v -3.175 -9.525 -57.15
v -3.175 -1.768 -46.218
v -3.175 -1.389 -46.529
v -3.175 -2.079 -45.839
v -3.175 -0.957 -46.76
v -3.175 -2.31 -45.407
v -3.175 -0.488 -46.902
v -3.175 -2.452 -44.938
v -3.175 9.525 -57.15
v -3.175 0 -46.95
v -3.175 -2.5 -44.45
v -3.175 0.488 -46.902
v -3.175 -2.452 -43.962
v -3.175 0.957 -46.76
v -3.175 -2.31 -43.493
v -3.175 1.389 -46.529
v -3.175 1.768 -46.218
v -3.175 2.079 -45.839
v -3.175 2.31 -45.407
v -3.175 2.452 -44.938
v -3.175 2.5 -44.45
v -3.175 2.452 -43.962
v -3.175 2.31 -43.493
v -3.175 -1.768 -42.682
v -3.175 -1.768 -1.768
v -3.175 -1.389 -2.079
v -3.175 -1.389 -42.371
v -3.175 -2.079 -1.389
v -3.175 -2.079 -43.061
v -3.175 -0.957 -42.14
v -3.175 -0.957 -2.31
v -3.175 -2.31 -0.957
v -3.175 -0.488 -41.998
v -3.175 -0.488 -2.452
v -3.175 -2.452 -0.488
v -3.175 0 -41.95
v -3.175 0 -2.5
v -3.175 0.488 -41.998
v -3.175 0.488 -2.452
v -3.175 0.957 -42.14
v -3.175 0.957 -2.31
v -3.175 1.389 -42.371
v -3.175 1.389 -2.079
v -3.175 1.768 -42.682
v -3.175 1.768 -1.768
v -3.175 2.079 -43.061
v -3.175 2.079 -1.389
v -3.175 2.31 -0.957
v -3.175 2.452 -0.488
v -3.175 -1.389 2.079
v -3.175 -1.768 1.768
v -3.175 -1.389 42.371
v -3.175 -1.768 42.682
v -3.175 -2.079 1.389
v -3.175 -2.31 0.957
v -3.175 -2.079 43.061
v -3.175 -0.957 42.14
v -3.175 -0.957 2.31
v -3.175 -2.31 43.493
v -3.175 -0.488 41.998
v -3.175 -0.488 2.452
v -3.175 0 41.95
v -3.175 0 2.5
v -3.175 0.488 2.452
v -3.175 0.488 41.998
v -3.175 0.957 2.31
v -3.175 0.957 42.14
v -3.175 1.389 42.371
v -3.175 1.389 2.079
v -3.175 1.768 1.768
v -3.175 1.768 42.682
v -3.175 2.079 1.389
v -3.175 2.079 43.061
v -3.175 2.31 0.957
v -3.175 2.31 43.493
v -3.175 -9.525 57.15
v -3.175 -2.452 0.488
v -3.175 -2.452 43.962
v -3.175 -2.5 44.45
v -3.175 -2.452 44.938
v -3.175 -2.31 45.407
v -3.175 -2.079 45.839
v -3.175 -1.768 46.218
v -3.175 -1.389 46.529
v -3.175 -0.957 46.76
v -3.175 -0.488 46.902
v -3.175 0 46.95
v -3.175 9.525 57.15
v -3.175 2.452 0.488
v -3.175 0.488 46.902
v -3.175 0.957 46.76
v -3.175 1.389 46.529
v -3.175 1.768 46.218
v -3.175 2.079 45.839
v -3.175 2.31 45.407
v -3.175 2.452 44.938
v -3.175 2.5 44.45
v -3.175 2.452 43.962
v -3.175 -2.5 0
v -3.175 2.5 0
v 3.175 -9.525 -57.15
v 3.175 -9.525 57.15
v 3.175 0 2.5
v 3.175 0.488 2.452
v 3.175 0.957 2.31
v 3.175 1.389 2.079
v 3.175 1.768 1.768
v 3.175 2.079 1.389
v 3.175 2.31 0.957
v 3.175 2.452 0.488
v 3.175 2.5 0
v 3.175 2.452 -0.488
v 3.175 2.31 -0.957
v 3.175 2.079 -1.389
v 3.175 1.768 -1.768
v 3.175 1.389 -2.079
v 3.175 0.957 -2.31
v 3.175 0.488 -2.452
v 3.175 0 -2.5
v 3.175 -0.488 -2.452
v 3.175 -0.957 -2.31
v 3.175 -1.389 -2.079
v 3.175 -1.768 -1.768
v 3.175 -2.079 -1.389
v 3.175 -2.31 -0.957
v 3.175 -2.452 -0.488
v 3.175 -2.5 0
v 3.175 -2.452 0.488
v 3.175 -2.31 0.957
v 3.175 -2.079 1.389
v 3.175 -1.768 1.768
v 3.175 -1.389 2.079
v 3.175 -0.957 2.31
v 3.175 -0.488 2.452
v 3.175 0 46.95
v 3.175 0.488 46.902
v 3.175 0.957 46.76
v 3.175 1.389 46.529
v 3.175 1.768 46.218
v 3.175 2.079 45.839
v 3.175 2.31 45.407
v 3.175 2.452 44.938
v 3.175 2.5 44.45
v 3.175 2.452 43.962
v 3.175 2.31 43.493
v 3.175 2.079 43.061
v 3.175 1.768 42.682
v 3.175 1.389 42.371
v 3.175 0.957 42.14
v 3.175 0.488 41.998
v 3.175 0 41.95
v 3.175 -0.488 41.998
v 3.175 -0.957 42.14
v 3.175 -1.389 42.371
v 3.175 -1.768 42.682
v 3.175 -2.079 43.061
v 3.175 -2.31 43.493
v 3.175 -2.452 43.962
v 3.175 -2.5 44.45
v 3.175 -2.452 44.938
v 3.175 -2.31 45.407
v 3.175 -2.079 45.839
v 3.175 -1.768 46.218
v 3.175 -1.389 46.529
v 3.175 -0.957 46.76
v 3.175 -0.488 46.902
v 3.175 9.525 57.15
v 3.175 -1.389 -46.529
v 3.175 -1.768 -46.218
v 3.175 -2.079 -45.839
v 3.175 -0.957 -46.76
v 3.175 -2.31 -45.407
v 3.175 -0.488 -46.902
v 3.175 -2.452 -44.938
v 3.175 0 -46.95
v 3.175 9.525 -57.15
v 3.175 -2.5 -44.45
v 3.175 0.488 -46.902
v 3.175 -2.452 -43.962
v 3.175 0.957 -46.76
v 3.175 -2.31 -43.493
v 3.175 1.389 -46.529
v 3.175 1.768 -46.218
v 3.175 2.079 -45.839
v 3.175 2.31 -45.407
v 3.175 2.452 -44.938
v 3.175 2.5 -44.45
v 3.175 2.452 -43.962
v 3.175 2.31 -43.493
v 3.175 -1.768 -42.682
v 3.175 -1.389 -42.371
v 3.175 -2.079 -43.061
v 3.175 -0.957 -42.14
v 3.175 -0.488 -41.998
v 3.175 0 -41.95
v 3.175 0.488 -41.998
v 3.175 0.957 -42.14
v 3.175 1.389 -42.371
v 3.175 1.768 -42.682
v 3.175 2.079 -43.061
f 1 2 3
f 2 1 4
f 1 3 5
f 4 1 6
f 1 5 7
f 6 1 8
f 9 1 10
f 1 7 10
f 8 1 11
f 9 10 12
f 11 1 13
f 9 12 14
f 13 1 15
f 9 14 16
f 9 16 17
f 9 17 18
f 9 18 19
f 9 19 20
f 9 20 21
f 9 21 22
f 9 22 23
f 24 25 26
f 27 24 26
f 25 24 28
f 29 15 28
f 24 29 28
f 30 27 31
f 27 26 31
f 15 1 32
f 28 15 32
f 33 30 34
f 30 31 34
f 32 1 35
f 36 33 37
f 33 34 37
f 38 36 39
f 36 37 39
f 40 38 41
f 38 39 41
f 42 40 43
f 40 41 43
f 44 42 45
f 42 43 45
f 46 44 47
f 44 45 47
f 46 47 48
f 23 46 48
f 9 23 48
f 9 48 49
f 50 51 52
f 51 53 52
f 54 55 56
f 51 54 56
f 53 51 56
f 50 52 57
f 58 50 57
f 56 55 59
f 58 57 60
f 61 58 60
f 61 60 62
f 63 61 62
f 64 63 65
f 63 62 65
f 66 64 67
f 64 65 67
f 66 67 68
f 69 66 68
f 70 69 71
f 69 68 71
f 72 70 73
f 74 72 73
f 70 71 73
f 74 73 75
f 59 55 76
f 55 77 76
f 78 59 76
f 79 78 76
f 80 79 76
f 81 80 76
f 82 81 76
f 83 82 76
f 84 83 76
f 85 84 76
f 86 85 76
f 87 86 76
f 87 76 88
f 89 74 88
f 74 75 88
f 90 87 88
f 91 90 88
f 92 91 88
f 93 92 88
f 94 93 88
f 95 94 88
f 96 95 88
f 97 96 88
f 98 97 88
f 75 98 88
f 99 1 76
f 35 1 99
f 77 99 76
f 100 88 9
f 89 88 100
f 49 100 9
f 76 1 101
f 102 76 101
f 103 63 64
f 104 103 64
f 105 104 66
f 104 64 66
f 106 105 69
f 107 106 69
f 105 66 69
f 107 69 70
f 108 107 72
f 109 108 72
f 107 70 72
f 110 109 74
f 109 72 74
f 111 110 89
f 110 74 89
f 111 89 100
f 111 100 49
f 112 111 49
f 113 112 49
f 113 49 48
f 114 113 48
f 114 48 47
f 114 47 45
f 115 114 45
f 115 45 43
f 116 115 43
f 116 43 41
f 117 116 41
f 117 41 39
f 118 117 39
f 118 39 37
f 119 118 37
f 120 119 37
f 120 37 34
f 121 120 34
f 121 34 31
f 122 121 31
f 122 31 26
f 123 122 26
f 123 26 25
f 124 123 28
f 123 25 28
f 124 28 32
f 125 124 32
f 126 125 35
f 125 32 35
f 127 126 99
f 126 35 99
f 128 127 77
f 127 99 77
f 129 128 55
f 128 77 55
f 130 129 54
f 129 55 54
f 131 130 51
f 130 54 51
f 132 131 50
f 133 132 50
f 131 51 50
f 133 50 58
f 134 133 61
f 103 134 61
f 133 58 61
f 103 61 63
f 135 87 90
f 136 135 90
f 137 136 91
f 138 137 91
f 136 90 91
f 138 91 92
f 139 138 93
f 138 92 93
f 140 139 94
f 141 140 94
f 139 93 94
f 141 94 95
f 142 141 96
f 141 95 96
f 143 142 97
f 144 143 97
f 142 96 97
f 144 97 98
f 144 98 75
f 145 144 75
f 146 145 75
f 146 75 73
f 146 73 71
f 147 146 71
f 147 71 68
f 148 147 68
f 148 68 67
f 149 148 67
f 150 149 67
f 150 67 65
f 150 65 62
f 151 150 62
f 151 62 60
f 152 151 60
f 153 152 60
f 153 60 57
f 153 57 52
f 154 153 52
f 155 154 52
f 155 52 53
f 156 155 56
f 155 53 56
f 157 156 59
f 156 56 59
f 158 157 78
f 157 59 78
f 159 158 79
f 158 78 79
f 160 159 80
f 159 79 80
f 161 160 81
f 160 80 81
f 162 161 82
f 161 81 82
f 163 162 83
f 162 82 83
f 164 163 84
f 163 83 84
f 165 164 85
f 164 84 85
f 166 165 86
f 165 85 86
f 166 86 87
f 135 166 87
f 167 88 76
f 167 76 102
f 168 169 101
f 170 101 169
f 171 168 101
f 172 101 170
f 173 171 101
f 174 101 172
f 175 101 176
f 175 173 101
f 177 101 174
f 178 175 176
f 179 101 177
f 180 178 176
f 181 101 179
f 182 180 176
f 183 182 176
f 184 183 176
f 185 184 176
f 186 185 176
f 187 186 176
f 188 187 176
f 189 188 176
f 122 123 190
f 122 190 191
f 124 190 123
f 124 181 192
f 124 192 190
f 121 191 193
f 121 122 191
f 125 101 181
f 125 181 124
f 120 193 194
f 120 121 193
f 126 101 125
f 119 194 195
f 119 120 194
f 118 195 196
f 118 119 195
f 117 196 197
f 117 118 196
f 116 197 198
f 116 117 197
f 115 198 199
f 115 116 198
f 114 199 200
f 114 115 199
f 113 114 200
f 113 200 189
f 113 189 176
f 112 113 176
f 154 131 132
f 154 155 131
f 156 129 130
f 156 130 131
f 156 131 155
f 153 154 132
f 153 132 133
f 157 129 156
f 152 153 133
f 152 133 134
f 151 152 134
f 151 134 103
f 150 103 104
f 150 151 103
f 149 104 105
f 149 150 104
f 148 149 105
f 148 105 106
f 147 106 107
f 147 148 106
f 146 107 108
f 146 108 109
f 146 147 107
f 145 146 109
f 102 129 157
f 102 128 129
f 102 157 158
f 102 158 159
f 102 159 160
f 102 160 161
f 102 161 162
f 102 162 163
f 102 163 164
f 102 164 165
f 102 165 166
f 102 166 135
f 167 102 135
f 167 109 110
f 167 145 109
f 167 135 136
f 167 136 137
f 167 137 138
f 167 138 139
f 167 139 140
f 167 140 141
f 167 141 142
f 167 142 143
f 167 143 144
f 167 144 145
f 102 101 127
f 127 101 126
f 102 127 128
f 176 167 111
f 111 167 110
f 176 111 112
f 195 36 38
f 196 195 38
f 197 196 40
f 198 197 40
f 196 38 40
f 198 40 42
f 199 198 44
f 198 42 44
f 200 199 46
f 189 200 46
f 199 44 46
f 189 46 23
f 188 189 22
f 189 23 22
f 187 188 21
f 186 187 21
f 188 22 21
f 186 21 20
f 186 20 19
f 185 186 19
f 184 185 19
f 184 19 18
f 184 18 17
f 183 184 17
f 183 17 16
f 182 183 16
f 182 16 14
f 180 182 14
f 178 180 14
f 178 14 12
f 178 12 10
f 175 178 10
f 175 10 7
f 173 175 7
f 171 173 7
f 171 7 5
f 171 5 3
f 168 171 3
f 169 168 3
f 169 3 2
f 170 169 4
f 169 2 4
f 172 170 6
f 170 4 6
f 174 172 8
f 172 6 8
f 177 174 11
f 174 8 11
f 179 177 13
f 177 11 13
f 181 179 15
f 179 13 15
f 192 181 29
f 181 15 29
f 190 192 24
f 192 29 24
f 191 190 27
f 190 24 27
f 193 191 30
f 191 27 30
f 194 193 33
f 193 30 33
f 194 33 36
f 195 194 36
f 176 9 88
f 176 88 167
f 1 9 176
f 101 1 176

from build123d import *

# Parameters (mm, degrees)
SKETCH1_W                 = 6.35
SKETCH1_H                 = 19.05
EXTRUDE1_DEPTH            = 57.15
M6X1_0_TAPPED_HOLE1_D     = 5
M6X1_0_TAPPED_HOLE1_DEPTH = 6.35
M6X1_0_TAPPED_HOLE2_D     = 5


with BuildPart() as part:
    # Sketch1 → Extrude1 (new body, symmetric)
    with BuildSketch(Plane.XY):
        Rectangle(SKETCH1_W, SKETCH1_H)
    extrude(amount=EXTRUDE1_DEPTH, both=True)

    # M6x1.0 Tapped Hole1
    with Locations(Plane(origin=(3.175, 0, 0), x_dir=(0, 0, -1), z_dir=(1, 0, 0))):
        with Locations((-44.45, 0), (44.45, 0)):
            Hole(M6X1_0_TAPPED_HOLE1_D / 2, depth=M6X1_0_TAPPED_HOLE1_DEPTH)

    # M6x1.0 Tapped Hole2 (through all)
    with Locations(Plane(origin=(3.175, 0, 0), x_dir=(0, 0, -1), z_dir=(1, 0, 0))):
        with Locations((0, 0)):
            Hole(M6X1_0_TAPPED_HOLE2_D / 2)


solid = part.part
